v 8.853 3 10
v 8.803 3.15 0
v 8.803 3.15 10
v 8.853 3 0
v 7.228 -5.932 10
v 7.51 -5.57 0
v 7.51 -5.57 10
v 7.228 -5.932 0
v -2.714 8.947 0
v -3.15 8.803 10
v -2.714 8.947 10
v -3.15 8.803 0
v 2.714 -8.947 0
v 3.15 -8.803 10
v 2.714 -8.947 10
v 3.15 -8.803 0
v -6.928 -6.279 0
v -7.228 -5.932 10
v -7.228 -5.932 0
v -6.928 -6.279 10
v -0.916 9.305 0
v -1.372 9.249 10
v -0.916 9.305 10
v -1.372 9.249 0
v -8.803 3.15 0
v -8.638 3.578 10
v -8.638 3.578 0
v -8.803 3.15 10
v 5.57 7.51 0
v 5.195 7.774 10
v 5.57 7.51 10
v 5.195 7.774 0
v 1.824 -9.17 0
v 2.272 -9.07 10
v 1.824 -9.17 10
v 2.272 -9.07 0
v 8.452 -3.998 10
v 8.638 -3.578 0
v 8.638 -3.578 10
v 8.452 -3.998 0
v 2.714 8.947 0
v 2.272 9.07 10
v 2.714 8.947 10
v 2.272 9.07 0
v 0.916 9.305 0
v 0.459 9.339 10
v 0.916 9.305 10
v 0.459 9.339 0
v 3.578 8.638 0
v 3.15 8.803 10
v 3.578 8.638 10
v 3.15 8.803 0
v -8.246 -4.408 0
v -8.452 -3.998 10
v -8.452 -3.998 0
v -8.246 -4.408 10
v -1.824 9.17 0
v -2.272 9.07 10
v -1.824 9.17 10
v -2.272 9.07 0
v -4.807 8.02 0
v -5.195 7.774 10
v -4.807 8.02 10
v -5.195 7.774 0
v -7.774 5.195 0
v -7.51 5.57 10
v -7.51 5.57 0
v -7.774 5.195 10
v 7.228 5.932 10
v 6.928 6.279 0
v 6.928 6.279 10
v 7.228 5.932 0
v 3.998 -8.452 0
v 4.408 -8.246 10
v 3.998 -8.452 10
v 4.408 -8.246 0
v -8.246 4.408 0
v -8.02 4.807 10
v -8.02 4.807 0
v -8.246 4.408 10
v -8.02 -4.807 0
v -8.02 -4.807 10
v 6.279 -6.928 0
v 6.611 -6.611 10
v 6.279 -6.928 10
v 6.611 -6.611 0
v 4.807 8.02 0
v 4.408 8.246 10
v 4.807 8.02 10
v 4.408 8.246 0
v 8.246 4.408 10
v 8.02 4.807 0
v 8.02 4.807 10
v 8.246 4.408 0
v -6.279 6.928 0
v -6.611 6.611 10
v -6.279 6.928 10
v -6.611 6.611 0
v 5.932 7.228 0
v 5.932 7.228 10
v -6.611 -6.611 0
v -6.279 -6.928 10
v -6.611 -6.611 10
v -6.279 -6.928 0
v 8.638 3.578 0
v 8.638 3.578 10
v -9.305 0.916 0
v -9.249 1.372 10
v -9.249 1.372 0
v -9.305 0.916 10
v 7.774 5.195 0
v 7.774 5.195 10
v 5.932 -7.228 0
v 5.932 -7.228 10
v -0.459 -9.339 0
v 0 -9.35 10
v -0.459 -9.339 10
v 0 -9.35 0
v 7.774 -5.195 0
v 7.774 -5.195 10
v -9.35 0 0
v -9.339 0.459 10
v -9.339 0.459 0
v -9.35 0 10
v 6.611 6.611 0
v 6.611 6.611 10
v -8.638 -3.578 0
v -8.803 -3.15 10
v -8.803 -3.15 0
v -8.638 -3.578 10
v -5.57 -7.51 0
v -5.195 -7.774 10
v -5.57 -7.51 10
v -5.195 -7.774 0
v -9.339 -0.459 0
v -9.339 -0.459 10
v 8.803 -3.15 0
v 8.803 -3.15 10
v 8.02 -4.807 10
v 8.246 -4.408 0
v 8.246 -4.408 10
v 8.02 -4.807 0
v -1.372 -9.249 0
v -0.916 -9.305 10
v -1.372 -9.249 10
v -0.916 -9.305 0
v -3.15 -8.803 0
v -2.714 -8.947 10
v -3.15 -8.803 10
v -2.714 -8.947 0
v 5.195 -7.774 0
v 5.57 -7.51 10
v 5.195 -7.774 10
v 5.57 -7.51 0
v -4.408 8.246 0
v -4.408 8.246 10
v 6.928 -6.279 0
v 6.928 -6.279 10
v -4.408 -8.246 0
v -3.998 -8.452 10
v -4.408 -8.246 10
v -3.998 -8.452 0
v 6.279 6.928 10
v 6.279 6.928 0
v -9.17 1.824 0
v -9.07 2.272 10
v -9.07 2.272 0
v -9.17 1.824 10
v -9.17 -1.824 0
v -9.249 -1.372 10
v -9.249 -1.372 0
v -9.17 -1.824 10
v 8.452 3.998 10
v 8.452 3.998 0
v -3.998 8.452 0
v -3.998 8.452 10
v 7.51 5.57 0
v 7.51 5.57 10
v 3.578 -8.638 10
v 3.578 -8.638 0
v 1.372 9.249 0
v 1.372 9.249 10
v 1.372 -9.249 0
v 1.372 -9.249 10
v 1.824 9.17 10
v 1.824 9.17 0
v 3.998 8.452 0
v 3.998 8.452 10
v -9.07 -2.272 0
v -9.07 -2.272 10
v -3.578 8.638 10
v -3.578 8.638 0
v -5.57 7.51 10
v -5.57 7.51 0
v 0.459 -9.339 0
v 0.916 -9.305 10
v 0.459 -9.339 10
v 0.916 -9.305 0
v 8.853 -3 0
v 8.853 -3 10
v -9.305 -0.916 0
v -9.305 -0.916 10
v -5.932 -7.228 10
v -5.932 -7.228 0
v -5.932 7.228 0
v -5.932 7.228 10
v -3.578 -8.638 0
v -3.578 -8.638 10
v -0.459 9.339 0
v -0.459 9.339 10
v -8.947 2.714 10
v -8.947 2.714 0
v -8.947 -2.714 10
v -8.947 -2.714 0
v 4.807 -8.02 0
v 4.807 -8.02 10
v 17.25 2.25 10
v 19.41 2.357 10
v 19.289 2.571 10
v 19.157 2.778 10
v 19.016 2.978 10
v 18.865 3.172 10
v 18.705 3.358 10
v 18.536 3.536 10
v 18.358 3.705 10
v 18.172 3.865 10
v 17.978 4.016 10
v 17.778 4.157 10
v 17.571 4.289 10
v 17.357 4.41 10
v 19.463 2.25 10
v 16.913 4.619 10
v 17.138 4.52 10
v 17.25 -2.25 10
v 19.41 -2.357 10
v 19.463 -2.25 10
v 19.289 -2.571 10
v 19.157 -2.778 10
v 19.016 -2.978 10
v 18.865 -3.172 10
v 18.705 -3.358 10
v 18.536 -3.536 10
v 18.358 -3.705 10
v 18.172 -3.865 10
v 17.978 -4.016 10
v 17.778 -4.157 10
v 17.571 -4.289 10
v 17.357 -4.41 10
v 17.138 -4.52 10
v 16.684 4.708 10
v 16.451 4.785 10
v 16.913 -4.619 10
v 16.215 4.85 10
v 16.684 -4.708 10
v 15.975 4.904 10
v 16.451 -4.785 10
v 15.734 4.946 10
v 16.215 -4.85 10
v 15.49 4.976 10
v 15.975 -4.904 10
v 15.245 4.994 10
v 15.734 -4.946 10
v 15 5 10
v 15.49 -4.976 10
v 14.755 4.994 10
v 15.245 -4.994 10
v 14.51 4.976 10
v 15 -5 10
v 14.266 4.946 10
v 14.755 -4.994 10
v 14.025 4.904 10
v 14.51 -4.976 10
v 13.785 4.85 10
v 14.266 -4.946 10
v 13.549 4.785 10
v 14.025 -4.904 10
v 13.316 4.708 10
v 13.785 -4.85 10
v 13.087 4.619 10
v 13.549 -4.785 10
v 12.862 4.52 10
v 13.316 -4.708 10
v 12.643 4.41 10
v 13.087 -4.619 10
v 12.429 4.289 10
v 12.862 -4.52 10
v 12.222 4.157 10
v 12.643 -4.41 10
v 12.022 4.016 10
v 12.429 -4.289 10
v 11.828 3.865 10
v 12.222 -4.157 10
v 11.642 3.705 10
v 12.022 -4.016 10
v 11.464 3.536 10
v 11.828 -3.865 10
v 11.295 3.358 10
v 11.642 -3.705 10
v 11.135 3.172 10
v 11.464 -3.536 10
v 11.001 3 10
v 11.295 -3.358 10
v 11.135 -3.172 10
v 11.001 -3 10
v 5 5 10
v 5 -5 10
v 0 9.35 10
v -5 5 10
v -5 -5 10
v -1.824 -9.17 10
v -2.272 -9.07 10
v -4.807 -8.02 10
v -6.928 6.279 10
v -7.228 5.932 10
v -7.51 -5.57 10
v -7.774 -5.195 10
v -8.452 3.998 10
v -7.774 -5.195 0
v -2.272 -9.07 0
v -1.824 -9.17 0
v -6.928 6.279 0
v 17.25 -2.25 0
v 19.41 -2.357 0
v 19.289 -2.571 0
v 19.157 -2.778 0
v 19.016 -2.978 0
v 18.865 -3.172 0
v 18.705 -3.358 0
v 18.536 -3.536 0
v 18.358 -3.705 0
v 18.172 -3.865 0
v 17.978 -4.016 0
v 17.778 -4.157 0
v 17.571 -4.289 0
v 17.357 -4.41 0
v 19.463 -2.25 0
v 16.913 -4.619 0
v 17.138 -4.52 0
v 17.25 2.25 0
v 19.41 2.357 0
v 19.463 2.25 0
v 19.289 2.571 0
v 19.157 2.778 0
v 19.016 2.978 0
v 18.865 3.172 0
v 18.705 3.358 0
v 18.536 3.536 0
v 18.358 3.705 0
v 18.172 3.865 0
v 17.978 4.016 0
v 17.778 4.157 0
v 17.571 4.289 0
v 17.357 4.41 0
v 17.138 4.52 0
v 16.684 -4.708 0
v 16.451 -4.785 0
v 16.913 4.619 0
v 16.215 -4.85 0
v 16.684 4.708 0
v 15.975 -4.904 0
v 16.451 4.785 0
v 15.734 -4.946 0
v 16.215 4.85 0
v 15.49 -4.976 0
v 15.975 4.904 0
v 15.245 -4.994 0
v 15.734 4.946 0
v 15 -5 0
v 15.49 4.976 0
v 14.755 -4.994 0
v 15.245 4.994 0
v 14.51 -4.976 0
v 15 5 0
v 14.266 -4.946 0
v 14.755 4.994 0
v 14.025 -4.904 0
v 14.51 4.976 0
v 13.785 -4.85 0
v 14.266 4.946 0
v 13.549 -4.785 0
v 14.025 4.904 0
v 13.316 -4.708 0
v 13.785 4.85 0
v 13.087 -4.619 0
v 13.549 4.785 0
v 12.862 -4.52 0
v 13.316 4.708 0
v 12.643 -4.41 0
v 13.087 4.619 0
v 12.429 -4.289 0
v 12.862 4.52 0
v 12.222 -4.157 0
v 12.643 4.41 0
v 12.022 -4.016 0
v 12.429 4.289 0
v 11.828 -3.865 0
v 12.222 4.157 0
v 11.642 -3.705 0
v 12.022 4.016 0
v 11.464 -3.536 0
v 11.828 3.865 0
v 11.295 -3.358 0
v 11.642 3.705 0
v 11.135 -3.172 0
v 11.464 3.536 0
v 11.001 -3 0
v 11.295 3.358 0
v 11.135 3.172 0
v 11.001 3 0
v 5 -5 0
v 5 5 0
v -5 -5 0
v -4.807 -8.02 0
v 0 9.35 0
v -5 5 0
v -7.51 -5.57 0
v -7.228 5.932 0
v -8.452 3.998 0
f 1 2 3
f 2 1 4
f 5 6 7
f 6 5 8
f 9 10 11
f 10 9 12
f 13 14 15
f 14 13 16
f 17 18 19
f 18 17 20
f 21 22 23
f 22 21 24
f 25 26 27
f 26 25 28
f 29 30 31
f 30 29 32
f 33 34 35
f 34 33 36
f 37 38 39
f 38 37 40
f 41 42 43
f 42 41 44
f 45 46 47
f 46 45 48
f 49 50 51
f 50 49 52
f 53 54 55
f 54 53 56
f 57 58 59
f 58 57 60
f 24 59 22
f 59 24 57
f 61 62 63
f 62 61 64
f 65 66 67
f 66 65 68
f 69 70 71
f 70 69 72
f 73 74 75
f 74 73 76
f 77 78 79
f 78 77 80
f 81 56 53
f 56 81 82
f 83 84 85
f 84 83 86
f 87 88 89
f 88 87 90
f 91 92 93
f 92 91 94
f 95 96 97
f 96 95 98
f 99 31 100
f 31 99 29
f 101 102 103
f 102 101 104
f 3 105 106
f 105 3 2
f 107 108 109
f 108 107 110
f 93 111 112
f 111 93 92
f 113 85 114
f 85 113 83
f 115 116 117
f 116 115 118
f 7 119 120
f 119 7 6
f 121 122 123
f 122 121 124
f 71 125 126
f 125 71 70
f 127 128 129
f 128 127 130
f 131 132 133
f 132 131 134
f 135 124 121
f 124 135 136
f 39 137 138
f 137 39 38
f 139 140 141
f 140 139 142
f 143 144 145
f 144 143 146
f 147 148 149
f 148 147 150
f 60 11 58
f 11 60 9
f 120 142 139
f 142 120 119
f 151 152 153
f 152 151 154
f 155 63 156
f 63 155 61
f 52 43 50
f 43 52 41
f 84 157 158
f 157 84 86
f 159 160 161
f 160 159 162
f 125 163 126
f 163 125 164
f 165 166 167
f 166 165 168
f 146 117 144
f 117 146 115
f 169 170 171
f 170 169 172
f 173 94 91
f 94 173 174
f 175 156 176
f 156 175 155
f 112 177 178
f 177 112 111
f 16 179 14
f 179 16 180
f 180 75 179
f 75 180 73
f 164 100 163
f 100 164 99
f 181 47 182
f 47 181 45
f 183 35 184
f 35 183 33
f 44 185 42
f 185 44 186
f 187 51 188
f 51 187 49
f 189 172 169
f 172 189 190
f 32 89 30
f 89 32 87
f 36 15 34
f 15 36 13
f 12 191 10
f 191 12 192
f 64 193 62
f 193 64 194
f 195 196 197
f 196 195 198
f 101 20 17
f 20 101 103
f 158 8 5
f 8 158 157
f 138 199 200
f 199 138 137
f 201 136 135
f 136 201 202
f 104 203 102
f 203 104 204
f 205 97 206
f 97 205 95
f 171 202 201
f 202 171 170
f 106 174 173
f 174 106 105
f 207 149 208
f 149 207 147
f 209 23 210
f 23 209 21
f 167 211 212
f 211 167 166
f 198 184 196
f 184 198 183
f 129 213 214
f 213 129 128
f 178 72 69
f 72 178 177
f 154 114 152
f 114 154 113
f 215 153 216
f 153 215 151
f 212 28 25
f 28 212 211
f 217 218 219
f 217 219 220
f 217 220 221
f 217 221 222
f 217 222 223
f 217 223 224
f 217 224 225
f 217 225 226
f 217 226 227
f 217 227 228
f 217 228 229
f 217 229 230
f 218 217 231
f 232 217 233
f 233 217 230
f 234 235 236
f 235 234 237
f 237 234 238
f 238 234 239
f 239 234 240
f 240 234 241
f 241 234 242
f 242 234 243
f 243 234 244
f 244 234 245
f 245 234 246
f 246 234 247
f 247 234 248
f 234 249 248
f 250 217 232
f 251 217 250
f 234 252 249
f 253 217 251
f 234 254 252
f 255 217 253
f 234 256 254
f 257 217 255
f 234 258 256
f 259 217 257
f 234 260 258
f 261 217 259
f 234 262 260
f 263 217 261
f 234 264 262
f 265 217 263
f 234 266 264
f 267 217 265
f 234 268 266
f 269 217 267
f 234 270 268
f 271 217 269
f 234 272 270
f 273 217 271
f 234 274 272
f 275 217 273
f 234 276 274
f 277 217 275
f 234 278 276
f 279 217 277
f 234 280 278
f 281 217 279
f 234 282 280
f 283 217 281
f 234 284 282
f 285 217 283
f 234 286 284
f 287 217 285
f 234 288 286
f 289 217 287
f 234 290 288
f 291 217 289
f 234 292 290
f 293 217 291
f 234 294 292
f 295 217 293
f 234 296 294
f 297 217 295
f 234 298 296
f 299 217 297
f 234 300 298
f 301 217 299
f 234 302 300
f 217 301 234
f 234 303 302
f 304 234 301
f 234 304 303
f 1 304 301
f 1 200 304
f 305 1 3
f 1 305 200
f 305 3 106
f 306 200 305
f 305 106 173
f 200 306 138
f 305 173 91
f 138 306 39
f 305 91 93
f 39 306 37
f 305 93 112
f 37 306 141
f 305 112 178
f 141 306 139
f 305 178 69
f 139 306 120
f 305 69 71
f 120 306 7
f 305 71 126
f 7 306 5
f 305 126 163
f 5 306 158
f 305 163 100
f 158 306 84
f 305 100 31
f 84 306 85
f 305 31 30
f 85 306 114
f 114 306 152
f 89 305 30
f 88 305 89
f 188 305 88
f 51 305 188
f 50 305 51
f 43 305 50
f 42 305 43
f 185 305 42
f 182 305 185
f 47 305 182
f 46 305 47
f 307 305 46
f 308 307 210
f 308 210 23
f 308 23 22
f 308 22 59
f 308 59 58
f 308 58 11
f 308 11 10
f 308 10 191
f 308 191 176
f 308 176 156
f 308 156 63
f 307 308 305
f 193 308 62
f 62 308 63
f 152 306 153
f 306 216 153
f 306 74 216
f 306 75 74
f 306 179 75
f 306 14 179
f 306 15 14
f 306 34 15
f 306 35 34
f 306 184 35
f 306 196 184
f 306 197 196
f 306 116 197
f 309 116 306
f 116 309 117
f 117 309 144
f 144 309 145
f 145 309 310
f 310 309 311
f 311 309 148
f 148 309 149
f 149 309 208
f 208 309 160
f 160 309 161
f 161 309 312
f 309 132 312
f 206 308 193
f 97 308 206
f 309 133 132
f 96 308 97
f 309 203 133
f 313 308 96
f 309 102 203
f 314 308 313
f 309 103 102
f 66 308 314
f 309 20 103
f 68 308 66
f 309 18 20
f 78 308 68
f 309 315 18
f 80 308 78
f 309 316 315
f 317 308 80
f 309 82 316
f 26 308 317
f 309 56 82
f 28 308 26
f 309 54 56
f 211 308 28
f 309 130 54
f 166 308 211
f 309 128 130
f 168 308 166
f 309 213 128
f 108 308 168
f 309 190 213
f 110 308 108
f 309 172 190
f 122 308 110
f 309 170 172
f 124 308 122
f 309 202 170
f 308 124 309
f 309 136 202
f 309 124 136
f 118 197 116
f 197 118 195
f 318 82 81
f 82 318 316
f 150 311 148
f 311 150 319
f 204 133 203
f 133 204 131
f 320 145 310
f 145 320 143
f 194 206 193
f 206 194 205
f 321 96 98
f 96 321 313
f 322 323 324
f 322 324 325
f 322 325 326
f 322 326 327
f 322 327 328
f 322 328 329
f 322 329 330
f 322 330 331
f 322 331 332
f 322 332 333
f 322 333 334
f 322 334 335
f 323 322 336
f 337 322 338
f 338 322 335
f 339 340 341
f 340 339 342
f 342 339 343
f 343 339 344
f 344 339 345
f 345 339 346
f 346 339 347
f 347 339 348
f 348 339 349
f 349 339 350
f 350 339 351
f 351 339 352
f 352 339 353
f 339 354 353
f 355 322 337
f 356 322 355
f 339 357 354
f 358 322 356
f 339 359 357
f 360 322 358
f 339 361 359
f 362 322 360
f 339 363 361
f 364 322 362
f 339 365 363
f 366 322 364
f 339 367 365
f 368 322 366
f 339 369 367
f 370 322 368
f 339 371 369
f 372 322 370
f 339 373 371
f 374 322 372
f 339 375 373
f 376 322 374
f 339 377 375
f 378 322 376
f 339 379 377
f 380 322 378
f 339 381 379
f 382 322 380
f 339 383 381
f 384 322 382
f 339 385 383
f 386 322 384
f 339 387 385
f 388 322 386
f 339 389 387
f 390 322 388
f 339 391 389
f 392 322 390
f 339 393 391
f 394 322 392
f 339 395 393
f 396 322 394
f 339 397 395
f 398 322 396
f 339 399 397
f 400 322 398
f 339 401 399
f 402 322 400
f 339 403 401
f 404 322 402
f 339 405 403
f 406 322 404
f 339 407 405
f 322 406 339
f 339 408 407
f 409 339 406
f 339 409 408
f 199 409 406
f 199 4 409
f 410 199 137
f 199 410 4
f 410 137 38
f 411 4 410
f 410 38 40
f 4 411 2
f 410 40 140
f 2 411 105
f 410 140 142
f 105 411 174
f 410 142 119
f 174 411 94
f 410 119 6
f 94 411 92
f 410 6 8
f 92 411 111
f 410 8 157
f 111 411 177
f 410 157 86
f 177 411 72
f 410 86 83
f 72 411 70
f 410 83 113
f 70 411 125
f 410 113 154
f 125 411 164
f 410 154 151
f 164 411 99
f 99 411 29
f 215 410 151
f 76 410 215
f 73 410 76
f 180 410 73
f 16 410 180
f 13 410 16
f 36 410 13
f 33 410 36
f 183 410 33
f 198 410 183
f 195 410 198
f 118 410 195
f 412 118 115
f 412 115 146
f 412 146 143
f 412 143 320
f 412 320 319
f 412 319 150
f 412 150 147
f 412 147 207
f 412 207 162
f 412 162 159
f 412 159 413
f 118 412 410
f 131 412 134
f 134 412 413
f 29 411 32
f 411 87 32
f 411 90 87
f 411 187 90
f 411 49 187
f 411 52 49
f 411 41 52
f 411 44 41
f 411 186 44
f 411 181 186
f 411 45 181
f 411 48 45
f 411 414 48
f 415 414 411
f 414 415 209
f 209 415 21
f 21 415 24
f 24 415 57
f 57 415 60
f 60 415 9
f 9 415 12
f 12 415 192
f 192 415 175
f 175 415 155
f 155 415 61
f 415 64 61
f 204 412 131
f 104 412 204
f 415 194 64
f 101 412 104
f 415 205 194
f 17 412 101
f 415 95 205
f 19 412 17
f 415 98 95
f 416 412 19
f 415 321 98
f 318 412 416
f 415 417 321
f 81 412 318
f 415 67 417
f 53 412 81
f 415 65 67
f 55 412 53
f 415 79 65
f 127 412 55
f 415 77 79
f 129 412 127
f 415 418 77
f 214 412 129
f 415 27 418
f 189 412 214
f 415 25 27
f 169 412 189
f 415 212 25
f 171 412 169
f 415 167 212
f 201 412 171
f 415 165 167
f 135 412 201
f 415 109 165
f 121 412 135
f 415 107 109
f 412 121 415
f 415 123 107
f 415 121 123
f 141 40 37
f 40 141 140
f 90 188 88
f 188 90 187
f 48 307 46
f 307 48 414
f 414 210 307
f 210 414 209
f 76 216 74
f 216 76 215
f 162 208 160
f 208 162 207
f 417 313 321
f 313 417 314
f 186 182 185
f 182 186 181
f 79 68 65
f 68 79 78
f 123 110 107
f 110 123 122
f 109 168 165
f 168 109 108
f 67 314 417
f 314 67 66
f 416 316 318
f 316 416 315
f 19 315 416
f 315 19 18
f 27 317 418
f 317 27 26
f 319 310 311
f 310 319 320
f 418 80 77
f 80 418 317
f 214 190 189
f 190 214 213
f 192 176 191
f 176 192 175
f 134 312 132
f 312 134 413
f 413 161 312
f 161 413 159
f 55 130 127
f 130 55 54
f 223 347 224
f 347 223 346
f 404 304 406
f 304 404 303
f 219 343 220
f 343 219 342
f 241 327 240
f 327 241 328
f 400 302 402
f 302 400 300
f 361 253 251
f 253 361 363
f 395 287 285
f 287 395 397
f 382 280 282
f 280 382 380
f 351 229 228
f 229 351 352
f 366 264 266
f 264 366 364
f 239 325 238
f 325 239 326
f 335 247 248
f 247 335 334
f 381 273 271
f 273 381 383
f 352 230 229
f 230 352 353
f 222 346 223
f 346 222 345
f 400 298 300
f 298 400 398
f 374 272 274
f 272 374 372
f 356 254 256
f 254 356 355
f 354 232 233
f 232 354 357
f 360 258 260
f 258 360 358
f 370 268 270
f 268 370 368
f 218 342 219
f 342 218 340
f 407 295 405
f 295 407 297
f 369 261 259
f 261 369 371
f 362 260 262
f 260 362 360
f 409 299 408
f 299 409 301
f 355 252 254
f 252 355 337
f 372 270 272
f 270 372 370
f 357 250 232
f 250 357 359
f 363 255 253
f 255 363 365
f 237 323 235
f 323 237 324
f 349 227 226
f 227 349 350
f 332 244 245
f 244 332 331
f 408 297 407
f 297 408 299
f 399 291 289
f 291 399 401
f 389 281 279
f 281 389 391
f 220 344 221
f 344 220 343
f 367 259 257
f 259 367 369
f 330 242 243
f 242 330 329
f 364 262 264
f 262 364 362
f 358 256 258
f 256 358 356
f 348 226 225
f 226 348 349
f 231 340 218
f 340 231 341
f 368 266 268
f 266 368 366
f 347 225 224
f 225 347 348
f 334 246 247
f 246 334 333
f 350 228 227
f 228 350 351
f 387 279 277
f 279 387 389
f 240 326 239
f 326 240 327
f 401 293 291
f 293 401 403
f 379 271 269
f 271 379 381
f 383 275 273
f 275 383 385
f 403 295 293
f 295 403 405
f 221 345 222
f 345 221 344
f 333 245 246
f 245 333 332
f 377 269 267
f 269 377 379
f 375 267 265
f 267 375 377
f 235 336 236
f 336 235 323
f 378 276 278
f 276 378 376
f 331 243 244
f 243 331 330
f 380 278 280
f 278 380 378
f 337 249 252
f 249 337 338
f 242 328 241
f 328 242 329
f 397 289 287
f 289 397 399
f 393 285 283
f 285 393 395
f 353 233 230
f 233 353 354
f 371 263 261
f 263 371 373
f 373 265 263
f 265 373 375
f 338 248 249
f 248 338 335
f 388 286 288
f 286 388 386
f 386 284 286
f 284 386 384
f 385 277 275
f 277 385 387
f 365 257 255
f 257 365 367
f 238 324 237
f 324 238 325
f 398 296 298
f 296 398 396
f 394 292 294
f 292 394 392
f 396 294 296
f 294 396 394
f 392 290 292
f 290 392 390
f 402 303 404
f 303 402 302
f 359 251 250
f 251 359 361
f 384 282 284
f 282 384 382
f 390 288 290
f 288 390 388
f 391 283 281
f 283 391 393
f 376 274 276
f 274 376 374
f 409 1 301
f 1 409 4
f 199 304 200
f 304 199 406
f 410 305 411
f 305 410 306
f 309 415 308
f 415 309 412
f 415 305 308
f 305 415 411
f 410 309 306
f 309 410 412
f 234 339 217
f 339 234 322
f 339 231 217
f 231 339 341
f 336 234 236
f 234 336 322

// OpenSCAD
// Tubing clip for 12.7 mm (1/2 inch) lab stand rod
// Print orientation: flat, extruded along Z (z = 0 to 10)

// ---------------- Parameters ----------------
extrusion_height   = 10;    // Z height of the part (mm)
rod_d              = 12.7;  // stand rod inner diameter (mm)
rod_wall           = 3;     // stand rod ring wall thickness (mm)
rod_opening_w      = 10;    // width of the -X side opening (mm)

tubing_d           = 6;     // tubing inner diameter (mm)
tubing_wall        = 2;     // tubing ring wall thickness (mm)
tubing_opening_w   = 4.5;   // width of the +X side opening (mm)

bridge_w           = 6;     // bridge width in Y (mm)
bridge_x_start     = 8;     // bridge start in X (mm)
bridge_x_end       = 12;    // bridge end in X (mm)

eps                = 0.5;   // cutter overshoot past faces (mm)
$fn                = 128;   // curve resolution

// ---------------- Derived ----------------
rod_outer = rod_d + 2 * rod_wall;        // 18.7 mm
tubing_outer = tubing_d + 2 * tubing_wall; // 10 mm
tubing_opening_half = tubing_opening_w / 2; // 2.25 mm

// ---------------- Model ----------------
difference() {
    union() {
        // Rod ring
        cylinder(h = extrusion_height, d = rod_outer);
        // Tubing ring
        translate([15, 0, 0])
            cylinder(h = extrusion_height, d = tubing_outer);
        // Solid bridge
        translate([bridge_x_start, -bridge_w / 2, 0])
            cube([bridge_x_end - bridge_x_start, bridge_w, extrusion_height]);
    }
    // Opening in the rod ring (-X side)
    translate([-rod_opening_w / 2, -rod_opening_w / 2, -eps])
        cube([rod_opening_w, rod_opening_w, extrusion_height + 2 * eps]);
    // Opening in the tubing ring (+X side)
    translate([15 + tubing_opening_half, -tubing_opening_half, -eps])
        cube([tubing_opening_w, tubing_opening_w, extrusion_height + 2 * eps]);
}
